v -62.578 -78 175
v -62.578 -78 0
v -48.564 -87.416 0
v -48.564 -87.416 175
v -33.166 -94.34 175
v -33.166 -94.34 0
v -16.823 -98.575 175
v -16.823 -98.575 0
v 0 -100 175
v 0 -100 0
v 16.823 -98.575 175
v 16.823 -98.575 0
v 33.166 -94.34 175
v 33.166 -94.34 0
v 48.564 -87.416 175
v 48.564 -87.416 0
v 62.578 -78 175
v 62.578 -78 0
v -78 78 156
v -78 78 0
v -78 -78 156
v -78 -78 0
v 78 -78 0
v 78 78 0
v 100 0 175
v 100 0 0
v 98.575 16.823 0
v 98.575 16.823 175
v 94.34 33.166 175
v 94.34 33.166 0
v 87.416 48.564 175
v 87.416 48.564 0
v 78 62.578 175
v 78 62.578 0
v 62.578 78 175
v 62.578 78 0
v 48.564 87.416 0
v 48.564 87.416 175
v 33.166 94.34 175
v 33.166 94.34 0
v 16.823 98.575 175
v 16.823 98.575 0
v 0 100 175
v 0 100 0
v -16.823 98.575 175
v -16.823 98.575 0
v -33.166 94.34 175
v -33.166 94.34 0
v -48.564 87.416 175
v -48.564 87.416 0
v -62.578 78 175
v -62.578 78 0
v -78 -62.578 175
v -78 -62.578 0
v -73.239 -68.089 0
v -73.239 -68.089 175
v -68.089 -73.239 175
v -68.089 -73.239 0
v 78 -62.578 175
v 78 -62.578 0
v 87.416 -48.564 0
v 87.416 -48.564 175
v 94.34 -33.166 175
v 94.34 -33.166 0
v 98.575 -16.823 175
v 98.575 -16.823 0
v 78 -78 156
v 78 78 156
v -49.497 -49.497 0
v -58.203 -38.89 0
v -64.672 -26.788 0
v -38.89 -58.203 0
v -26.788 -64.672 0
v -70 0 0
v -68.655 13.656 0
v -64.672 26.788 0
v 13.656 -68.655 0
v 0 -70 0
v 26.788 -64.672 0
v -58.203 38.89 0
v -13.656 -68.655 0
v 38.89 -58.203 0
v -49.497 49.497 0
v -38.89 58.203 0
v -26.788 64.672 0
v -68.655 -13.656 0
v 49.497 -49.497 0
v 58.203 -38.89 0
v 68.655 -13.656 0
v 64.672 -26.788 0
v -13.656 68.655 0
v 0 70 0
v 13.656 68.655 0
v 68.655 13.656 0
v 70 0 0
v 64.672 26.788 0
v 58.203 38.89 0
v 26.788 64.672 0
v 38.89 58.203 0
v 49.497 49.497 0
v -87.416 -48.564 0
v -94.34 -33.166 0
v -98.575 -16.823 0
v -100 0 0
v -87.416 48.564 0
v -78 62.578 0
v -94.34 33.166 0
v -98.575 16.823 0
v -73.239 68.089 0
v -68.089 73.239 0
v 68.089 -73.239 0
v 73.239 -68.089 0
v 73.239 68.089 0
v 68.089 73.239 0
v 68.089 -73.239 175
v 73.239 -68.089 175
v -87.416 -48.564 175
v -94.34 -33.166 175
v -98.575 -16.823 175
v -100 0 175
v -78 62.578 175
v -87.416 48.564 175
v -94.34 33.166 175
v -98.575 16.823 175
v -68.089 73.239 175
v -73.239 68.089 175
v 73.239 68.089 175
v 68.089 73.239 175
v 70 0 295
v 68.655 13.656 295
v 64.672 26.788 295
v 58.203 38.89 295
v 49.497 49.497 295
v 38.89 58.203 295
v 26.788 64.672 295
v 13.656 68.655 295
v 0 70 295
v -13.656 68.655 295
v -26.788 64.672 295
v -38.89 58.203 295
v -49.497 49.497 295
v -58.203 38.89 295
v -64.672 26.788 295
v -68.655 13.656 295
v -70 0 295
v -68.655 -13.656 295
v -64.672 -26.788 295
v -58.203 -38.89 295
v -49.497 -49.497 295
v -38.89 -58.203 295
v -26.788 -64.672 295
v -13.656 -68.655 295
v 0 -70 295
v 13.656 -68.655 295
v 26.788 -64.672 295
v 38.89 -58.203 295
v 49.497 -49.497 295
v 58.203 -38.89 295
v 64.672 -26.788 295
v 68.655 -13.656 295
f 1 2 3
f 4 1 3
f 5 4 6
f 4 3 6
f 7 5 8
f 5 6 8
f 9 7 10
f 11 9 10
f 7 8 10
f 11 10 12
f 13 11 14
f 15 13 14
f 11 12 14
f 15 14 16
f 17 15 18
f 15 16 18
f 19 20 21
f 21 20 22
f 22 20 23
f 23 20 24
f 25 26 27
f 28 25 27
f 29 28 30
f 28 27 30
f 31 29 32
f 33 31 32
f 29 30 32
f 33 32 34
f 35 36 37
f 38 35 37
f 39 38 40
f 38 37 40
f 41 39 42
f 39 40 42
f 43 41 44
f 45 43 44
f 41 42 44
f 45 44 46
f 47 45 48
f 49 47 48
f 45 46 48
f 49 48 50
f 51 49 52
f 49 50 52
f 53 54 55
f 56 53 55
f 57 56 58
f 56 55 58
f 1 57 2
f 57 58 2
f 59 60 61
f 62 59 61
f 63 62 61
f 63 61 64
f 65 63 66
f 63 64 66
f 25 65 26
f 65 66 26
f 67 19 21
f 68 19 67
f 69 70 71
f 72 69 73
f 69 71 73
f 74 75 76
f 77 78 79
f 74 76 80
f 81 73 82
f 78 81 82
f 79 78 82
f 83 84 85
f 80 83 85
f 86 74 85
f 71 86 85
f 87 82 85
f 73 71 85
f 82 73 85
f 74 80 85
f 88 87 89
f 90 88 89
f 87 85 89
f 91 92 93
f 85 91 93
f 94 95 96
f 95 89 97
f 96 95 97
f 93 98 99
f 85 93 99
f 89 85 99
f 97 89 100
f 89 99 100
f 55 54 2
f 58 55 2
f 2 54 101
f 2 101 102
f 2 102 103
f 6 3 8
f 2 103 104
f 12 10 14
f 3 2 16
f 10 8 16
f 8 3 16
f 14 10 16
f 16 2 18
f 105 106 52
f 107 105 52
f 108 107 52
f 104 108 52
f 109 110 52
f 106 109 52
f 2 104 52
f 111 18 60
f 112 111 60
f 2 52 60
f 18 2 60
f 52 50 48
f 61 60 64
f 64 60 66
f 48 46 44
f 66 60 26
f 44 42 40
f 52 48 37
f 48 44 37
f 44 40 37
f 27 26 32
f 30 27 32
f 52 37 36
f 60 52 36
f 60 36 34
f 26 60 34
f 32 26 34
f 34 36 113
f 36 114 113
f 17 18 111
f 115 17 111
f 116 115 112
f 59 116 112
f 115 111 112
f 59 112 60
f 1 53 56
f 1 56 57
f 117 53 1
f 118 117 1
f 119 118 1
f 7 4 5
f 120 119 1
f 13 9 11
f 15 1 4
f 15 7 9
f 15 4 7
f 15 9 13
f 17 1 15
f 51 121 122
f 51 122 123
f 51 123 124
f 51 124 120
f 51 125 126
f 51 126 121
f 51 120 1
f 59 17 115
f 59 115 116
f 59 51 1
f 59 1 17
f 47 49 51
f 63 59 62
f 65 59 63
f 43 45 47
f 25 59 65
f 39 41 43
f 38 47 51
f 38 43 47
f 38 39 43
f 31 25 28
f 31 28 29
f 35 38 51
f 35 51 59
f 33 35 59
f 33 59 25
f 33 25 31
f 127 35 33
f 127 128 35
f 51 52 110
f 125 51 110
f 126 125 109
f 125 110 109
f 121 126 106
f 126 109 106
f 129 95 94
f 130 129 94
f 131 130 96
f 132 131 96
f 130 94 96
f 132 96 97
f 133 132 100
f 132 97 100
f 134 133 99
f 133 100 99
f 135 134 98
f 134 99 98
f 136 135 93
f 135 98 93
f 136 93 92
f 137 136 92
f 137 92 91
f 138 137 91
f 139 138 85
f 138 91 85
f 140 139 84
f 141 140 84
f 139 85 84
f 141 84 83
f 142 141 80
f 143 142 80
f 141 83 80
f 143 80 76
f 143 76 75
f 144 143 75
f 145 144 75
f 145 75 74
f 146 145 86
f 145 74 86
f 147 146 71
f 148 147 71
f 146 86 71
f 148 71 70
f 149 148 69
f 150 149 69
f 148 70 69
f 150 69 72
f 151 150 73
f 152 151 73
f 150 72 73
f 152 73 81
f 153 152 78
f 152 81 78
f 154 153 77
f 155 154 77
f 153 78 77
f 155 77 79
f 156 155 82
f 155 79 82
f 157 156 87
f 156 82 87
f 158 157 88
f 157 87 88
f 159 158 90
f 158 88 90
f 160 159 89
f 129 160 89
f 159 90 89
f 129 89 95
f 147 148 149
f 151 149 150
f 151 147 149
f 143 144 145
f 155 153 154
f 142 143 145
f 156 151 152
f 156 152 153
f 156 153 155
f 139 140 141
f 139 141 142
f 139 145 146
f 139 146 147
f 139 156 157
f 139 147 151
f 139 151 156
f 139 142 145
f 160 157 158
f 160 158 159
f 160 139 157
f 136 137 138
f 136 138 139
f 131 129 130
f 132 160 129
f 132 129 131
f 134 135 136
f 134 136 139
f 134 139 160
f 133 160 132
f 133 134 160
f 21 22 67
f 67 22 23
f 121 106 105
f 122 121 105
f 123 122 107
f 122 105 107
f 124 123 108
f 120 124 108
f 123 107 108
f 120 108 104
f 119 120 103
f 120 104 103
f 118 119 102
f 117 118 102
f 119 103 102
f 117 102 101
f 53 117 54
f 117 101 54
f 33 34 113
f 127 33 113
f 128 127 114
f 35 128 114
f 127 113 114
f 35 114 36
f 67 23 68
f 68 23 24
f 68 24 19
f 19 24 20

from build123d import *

# Parameters (mm, degrees)
F0_R     = 70
F1_DEPTH = 156
F2_DEPTH = 175
F3_DEPTH = 295


with BuildPart() as f1:
    # F0 (on Top) → F1 (new body)
    with BuildSketch(Plane.XY):
        with BuildLine():
            ThreePointArc((-78, 62.5779513887), (-70.7106781187, 70.7106781187), (-62.5779513886, 78))
            Line((-62.5779513886, 78), (-78, 78))
            Line((-78, 78), (-78, 62.5779513887))
        make_face()
        with BuildLine():
            Line((78, -62.5779513886), (78, 62.5779513886))
            ThreePointArc((78, 62.5779513886), (70.7106781187, 70.7106781187), (62.5779513886, 78))
            Line((62.5779513886, 78), (-62.5779513886, 78))
            ThreePointArc((-62.5779513886, 78), (-70.7106781187, 70.7106781187), (-78, 62.5779513887))
            Line((-78, 62.5779513887), (-78, -62.5779513887))
            ThreePointArc((-78, -62.5779513887), (-70.7106781187, -70.7106781187), (-62.5779513886, -78))
            Line((-62.5779513886, -78), (62.5779513886, -78))
            ThreePointArc((62.5779513886, -78), (70.7106781187, -70.7106781187), (78, -62.5779513886))
        make_face()
        Circle(F0_R, mode=Mode.SUBTRACT)
        with BuildLine():
            ThreePointArc((62.5779513886, 78), (70.7106781187, 70.7106781187), (78, 62.5779513886))
            Line((78, 62.5779513886), (78, 78))
            Line((78, 78), (62.5779513886, 78))
        make_face()
        with BuildLine():
            Line((-78, -78), (-62.5779513886, -78))
            ThreePointArc((-62.5779513886, -78), (-70.7106781187, -70.7106781187), (-78, -62.5779513887))
            Line((-78, -62.5779513887), (-78, -78))
        make_face()
        with BuildLine():
            Line((78, -78), (78, -62.5779513886))
            ThreePointArc((78, -62.5779513886), (70.7106781187, -70.7106781187), (62.5779513886, -78))
            Line((62.5779513886, -78), (78, -78))
        make_face()
        Circle(F0_R)
    extrude(amount=F1_DEPTH)


with BuildPart() as f2:
    # F0 (on Top) → F2 (new body)
    with BuildSketch(Plane.XY):
        with BuildLine():
            Line((-78, -62.5779513887), (-78, 62.5779513887))
            ThreePointArc((-78, 62.5779513887), (-100, 0), (-78, -62.5779513887))
        make_face()
        with BuildLine():
            Line((78, -62.5779513886), (78, 62.5779513886))
            ThreePointArc((78, 62.5779513886), (70.7106781187, 70.7106781187), (62.5779513886, 78))
            Line((62.5779513886, 78), (-62.5779513886, 78))
            ThreePointArc((-62.5779513886, 78), (-70.7106781187, 70.7106781187), (-78, 62.5779513887))
            Line((-78, 62.5779513887), (-78, -62.5779513887))
            ThreePointArc((-78, -62.5779513887), (-70.7106781187, -70.7106781187), (-62.5779513886, -78))
            Line((-62.5779513886, -78), (62.5779513886, -78))
            ThreePointArc((62.5779513886, -78), (70.7106781187, -70.7106781187), (78, -62.5779513886))
        make_face()
        Circle(F0_R, mode=Mode.SUBTRACT)
        with BuildLine():
            ThreePointArc((-62.5779513886, -78), (0, -100), (62.5779513886, -78))
            Line((62.5779513886, -78), (-62.5779513886, -78))
        make_face()
        with BuildLine():
            ThreePointArc((78, -62.5779513886), (94.3398113206, -33.1662479036), (100, 0))
            ThreePointArc((100, 0), (94.3398113206, 33.1662479036), (78, 62.5779513886))
            Line((78, 62.5779513886), (78, -62.5779513886))
        make_face()
        with BuildLine():
            Line((-62.5779513886, 78), (62.5779513886, 78))
            ThreePointArc((62.5779513886, 78), (0, 100), (-62.5779513886, 78))
        make_face()
        Circle(F0_R)
    extrude(amount=F2_DEPTH)


with BuildPart() as f3:
    # F0 (on Top) → F3 (new body)
    with BuildSketch(Plane.XY):
        Circle(F0_R)
    extrude(amount=F3_DEPTH)


solid = Compound([f1.part, f2.part, f3.part])
